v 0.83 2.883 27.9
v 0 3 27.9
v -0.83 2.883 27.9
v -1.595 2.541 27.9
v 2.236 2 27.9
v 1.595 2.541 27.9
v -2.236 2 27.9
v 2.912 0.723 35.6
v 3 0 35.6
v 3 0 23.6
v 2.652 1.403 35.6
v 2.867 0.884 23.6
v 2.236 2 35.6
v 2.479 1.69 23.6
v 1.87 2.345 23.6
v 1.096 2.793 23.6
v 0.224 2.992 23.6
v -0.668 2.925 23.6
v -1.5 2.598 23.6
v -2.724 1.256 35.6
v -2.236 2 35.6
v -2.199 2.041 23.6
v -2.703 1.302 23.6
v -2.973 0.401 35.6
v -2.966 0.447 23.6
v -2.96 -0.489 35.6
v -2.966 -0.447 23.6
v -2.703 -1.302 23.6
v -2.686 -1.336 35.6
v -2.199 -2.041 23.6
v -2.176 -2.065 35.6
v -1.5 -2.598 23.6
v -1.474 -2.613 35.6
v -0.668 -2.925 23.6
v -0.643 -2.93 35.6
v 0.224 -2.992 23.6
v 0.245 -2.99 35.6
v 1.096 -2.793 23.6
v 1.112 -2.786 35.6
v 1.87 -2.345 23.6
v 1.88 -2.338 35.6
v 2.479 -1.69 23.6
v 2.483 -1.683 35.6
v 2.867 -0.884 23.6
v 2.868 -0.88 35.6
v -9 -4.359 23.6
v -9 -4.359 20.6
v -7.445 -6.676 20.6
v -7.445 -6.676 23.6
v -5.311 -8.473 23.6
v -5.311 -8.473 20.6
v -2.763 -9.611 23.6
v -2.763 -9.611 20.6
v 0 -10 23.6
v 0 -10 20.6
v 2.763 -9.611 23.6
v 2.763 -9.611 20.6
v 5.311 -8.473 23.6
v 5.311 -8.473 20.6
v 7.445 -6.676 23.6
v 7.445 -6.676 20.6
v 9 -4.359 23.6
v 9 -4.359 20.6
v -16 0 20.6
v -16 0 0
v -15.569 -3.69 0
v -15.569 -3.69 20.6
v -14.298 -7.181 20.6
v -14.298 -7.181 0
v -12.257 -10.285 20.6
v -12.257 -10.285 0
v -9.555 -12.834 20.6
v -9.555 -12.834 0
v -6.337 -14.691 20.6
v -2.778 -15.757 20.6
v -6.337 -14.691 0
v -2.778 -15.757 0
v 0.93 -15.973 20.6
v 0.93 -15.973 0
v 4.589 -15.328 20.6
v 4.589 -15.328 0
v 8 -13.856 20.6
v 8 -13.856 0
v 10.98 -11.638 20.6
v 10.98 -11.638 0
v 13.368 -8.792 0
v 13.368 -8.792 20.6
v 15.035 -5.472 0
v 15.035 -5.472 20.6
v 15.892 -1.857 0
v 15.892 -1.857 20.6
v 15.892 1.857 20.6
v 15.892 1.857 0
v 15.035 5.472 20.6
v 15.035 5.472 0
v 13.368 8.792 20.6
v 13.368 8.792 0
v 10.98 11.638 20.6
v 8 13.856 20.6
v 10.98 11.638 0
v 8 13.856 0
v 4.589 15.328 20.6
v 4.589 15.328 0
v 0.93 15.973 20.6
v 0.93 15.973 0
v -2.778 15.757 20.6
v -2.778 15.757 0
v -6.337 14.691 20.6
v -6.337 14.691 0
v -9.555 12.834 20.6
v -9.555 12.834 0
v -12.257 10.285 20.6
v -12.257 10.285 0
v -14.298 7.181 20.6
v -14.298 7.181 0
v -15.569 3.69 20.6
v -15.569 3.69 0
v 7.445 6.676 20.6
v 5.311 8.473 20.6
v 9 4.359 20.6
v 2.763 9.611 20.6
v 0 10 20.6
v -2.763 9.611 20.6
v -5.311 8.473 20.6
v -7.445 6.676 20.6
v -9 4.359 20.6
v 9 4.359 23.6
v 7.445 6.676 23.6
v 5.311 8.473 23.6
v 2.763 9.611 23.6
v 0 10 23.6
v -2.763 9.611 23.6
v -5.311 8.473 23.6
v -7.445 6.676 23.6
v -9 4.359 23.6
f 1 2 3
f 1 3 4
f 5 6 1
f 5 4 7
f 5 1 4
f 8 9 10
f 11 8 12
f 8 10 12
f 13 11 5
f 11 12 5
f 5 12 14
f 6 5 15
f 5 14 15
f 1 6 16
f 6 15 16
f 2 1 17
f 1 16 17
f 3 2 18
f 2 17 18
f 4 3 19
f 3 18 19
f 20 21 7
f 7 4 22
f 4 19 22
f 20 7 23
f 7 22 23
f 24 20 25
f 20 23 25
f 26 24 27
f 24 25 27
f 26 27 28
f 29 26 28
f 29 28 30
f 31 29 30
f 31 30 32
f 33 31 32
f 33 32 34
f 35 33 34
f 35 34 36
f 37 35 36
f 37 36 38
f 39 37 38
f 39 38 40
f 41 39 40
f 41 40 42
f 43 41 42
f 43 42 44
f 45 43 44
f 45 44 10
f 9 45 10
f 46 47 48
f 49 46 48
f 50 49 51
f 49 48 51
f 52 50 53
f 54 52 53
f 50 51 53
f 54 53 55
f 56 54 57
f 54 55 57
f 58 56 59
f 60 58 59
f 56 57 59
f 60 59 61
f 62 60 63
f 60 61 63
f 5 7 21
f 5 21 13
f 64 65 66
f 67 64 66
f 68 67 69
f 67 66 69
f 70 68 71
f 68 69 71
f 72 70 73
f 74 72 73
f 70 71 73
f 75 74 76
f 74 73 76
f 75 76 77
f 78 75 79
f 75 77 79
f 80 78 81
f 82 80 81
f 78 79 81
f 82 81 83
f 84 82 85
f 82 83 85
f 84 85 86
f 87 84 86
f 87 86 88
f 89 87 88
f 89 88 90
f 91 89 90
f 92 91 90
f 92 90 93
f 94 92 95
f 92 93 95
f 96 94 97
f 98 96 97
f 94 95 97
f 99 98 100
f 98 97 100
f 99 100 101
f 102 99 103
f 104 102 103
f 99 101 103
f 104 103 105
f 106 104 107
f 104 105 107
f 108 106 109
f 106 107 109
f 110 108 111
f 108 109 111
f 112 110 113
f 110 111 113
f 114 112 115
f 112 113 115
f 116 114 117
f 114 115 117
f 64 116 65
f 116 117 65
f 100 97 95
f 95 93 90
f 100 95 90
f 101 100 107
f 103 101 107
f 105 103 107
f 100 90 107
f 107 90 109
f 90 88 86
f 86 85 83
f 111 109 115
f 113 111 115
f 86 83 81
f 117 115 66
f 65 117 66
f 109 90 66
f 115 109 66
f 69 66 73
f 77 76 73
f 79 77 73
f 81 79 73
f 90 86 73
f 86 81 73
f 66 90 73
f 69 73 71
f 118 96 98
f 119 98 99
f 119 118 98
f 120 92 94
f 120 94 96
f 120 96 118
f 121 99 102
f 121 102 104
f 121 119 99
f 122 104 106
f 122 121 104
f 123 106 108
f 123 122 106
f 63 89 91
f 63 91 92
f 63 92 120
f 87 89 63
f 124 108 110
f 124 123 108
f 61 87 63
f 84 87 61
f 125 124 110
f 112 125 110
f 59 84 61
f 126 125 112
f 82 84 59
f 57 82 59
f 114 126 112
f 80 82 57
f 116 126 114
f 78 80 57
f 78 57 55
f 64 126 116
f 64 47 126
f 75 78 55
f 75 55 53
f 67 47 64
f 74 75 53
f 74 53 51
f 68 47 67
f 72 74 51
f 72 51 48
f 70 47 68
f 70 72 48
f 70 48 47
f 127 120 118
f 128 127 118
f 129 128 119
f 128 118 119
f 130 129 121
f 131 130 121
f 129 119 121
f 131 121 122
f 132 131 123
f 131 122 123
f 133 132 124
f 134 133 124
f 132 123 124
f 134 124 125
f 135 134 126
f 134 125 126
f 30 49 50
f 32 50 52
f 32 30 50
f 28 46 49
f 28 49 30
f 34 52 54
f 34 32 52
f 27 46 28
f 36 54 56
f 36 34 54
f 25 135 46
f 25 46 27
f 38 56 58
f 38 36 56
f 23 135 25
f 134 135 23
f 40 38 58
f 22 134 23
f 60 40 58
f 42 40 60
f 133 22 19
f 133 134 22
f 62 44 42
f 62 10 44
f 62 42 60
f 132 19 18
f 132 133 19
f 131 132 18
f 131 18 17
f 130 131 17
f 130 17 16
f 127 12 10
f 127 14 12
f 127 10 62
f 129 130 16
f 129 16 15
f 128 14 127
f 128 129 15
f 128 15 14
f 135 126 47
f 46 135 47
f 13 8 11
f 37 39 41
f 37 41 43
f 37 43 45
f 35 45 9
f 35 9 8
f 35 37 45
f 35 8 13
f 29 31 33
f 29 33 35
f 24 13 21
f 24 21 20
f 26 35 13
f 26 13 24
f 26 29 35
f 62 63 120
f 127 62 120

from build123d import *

# Parameters (mm, degrees)
SKETCH_1_R          = 16
EXTRUDE_1_DEPTH     = 20.6
EXTRUDE_2_DEPTH     = 3
SKETCH_3_R          = 3
EXTRUDE_3_DEPTH     = 16.3
CUT_EXTRUDE_START   = -12
CUT_EXTRUDE_1_DEPTH = 12
CUT_EXTRUDE_START_2 = -4.3
SKETCH_7_R          = 3
CUT_EXTRUDE_2_DEPTH = 4.3


with BuildPart() as part:
    # ｽｹｯﾁ1 → ﾎﾞｽ - 押し出し1 (new body)
    with BuildSketch(Plane.XY):
        with Locations(Location((0, 0, 0), (0, 0, 180))):
            Circle(SKETCH_1_R)
    extrude(amount=EXTRUDE_1_DEPTH)

    # ｽｹｯﾁ2 → ﾎﾞｽ - 押し出し2 (add)
    with BuildSketch(Plane.XY.offset(20.6)):
        with BuildLine():
            Line((-9, 4.358898944), (-9, -4.358898944))
            ThreePointArc((-9, -4.358898944), (0, -10), (9, -4.358898944))
            Line((9, -4.358898944), (9, 4.358898944))
            ThreePointArc((9, 4.358898944), (0, 10), (-9, 4.358898944))
        make_face()
    extrude(amount=EXTRUDE_2_DEPTH)

    # ｽｹｯﾁ3 → ﾎﾞｽ - 押し出し3 (add)
    with BuildSketch(Plane.XY.offset(23.6)):
        Circle(SKETCH_3_R)
    extrude(amount=EXTRUDE_3_DEPTH)

    # ｽｹｯﾁ4 → ｶｯﾄ - 押し出し1 (cut)
    with BuildSketch(Plane.XY.offset(39.9).offset(CUT_EXTRUDE_START)):
        with BuildLine():
            Line((-2.236067977, 2), (2.236067977, 2))
            ThreePointArc((2.236067977, 2), (0, 3), (-2.236067977, 2))
        make_face()
    extrude(amount=CUT_EXTRUDE_1_DEPTH, mode=Mode.SUBTRACT)

    # ｽｹｯﾁ7 → ｶｯﾄ - 押し出し2 (cut)
    with BuildSketch(Plane.XY.offset(39.9).offset(CUT_EXTRUDE_START_2)):
        with Locations(Location((0, 0, 0), (0, 0, 138.189685104))):
            Circle(SKETCH_7_R)
    extrude(amount=CUT_EXTRUDE_2_DEPTH, mode=Mode.SUBTRACT)


solid = part.part
